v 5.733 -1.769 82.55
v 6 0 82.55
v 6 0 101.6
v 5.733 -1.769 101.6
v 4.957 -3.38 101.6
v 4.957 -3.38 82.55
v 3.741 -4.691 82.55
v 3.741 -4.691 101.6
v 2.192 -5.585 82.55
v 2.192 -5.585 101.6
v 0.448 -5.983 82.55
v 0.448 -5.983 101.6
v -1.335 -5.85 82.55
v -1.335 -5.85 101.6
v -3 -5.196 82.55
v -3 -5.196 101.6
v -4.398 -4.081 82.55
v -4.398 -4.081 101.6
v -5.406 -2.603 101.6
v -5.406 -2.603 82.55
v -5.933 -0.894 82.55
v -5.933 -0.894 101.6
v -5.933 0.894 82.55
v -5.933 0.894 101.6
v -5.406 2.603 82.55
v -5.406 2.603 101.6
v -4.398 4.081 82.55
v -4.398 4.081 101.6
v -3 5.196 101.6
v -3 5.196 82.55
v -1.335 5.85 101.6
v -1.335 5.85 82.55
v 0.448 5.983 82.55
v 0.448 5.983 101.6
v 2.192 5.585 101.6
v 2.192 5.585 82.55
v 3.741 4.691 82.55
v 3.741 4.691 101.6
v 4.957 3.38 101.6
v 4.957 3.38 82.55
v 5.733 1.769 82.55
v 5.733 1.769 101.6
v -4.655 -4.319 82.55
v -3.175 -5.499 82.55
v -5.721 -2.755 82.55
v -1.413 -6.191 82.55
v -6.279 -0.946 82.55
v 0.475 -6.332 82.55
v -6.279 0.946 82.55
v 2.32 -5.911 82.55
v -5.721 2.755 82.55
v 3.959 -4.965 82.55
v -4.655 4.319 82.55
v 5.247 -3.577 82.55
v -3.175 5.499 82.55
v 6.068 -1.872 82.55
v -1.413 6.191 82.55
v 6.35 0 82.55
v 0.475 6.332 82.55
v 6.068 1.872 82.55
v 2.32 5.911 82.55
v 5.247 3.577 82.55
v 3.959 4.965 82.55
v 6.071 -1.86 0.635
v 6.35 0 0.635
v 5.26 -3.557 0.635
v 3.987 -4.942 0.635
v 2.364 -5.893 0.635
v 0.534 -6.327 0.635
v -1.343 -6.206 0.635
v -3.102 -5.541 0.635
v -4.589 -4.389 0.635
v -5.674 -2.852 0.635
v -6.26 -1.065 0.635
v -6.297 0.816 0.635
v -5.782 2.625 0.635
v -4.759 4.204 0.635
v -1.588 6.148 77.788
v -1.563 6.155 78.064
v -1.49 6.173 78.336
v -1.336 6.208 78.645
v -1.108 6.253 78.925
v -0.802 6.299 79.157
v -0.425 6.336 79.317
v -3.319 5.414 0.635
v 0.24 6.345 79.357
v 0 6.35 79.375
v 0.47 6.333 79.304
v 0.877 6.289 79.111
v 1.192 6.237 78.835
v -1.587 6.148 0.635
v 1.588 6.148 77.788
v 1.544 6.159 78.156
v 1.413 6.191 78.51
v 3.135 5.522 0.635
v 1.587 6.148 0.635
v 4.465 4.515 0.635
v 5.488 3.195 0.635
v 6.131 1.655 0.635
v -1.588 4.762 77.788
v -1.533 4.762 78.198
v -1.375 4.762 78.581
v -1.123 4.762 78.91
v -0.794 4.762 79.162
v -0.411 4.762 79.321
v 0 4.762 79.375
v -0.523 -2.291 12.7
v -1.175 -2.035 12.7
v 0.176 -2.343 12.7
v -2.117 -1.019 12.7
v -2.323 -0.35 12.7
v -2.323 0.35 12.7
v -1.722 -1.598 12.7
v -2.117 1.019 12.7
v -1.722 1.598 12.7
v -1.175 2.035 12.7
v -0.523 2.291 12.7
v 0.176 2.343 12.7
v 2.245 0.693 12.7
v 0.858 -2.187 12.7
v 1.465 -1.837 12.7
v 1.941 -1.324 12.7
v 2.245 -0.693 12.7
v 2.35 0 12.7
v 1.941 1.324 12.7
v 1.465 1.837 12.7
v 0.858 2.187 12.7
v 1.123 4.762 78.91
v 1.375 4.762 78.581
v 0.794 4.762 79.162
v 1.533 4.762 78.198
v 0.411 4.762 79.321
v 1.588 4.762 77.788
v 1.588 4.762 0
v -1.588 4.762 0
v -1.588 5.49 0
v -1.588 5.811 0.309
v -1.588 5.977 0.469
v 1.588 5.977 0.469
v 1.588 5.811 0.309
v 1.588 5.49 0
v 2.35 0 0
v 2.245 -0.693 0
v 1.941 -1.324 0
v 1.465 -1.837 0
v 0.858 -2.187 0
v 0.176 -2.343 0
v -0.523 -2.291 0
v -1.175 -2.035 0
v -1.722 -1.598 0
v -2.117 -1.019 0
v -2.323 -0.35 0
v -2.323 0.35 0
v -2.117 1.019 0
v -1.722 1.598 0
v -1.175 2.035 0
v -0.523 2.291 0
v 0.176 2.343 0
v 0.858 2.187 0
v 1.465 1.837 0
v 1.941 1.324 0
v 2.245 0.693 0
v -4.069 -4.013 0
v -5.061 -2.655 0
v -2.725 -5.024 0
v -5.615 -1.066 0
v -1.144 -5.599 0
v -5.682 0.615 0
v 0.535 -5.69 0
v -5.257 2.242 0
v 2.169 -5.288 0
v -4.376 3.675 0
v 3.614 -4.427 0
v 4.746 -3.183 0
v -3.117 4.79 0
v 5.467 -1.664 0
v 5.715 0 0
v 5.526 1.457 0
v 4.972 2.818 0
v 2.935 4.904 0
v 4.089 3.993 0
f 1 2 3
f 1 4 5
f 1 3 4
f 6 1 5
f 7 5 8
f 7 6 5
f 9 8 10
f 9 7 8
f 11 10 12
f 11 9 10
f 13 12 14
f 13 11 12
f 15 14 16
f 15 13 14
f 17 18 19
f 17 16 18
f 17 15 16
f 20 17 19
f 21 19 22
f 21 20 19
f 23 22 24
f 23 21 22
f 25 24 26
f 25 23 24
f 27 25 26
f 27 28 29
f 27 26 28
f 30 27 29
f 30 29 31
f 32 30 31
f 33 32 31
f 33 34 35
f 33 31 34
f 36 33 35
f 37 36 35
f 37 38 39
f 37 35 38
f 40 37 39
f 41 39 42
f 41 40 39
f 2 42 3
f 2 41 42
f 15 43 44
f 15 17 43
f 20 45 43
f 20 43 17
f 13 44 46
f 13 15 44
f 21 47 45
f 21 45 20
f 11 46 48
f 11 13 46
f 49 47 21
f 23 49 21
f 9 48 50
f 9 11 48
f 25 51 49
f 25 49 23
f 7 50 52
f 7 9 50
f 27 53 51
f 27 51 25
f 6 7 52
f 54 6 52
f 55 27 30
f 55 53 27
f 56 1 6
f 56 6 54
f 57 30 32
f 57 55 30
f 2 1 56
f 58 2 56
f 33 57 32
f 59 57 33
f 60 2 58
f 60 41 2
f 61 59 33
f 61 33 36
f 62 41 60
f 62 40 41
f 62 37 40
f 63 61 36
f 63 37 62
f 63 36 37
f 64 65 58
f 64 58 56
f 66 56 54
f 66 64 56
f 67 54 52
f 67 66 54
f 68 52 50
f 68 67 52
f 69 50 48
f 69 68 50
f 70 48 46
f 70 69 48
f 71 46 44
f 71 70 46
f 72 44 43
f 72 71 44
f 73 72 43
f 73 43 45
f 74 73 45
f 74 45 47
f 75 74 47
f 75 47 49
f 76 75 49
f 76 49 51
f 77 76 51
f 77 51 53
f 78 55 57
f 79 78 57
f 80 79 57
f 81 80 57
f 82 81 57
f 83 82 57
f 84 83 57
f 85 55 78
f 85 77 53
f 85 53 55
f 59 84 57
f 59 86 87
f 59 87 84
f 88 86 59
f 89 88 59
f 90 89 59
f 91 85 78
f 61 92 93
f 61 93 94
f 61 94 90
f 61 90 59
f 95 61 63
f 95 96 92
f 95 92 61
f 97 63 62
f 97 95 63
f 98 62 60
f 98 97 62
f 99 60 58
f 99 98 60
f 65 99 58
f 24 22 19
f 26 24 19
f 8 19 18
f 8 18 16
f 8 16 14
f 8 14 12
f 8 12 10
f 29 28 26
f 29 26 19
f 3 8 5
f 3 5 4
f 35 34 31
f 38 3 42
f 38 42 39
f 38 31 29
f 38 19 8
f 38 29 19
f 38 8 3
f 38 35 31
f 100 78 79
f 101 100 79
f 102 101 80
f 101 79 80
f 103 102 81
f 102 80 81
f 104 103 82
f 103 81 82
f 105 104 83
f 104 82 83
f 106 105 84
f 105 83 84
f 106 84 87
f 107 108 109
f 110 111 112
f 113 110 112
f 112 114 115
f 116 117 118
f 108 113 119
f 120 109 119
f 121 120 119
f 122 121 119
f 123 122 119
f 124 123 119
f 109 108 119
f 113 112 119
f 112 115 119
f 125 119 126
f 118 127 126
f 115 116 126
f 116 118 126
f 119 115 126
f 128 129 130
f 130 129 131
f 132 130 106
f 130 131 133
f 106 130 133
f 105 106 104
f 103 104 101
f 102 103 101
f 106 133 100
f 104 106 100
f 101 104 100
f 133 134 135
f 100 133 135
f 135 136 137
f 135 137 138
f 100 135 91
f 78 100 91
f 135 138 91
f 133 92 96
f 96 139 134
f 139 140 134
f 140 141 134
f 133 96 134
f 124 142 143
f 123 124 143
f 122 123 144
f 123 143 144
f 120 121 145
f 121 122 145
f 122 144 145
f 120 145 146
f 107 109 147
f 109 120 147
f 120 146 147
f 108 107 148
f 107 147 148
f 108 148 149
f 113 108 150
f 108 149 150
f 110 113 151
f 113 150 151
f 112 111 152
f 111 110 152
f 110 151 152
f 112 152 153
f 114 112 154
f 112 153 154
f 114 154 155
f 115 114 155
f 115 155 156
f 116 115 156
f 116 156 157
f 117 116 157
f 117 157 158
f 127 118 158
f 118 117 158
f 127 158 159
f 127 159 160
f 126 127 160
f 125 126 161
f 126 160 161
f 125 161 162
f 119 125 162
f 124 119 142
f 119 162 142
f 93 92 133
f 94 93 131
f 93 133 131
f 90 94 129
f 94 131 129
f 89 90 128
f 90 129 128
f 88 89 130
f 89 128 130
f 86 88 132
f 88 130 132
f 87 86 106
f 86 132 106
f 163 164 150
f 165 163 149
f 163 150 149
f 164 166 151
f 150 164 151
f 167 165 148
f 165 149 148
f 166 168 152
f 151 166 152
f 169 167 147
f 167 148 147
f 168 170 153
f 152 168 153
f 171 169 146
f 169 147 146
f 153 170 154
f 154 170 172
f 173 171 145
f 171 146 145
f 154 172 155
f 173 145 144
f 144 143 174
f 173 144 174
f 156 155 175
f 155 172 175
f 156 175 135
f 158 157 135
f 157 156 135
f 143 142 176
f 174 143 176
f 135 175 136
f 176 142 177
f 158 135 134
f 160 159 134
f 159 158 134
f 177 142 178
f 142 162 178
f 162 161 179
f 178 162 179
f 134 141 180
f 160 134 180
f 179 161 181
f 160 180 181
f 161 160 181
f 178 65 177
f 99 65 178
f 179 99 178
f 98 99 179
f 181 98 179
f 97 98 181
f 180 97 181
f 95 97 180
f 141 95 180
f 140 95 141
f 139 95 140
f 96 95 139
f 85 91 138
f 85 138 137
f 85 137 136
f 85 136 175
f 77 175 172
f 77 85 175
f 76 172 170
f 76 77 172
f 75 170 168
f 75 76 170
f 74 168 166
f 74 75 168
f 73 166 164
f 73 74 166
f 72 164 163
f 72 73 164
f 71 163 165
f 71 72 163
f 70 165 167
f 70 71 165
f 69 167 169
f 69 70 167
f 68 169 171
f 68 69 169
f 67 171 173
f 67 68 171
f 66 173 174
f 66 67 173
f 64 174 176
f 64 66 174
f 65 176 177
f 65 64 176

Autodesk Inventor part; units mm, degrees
ref_plane "YZ Plane" through (0, 0, 0) normal (1, 0, 0) x (0, 1, 0)
ref_plane "XZ Plane" through (0, 0, 0) normal (0, 1, 0) x (-1, 0, 0)
ref_plane "XY Plane" through (0, 0, 0) normal (0, 0, 1) x (1, 0, 0)
sketch "Sketch1" plane through (0, 0, 0) normal (0, 0, 1) x (1, 0, 0)
  circle A0 centre (0, 0) radius 6.35
  circle A1 centre (0, 0) radius 2.3495
  dimension "d0" = 12.7
  dimension "d2" = 4.699
extrude "Extrusion1" add sketch "Sketch1" along normal blind 82.55 contours A0 | A1
extrude "Extrusion2" cut sketch "Sketch1" along normal blind 12.7 contours A1
sketch "Sketch2" plane through (0, 0, 82.55) normal (0, 0, 1) x (1, 0, 0)
  circle A0 centre (0, 0) radius 6.35 projected
  circle A1 centre (0, 0) radius 6
  dimension "d7" = 12
extrude "Extrusion3" add sketch "Sketch2" along normal blind 19.05 contours A1
sketch "Sketch3" plane through (0, 0, 0) normal (0, 0, -1) x (-1, 0, 0)
  circle A0 centre (0, 0) radius 6.35 projected
  line L0 (-1.5875, 6.1484) -> (-1.5875, 4.7625)
  line L1 (-1.5875, 4.7625) -> (1.5875, 4.7625)
  line L2 (1.5875, 4.7625) -> (1.5875, 6.1484)
  line L3 (0, 0) -> (0, 6.35) construction
  point P0 (0, 4.7625)
  dimension "d11" = 3.175
  dimension "d13" = 1.5875
extrude "Extrusion4" cut sketch "Sketch3" against normal blind 79.375 contours L2 L1 L0 A0 picked at (0.1781, 5.2842)
fillet "Fillet1" radius 1.5875 2 edges at (-1.5875, 5.4554, 79.375) (1.5875, 5.4554, 79.375)
chamfer "Chamfer1" distance 0.635 angle 45 2 edges at (5.0201, 3.8886, 0) (-3.8886, -5.0201, 0)
thread "Thread1" size "10-32 UNF" class "2B" standard "ANSI Unified Screw Threads" full length
properties part number "P80 Shaft (3.25 inch)" material "Steel"
